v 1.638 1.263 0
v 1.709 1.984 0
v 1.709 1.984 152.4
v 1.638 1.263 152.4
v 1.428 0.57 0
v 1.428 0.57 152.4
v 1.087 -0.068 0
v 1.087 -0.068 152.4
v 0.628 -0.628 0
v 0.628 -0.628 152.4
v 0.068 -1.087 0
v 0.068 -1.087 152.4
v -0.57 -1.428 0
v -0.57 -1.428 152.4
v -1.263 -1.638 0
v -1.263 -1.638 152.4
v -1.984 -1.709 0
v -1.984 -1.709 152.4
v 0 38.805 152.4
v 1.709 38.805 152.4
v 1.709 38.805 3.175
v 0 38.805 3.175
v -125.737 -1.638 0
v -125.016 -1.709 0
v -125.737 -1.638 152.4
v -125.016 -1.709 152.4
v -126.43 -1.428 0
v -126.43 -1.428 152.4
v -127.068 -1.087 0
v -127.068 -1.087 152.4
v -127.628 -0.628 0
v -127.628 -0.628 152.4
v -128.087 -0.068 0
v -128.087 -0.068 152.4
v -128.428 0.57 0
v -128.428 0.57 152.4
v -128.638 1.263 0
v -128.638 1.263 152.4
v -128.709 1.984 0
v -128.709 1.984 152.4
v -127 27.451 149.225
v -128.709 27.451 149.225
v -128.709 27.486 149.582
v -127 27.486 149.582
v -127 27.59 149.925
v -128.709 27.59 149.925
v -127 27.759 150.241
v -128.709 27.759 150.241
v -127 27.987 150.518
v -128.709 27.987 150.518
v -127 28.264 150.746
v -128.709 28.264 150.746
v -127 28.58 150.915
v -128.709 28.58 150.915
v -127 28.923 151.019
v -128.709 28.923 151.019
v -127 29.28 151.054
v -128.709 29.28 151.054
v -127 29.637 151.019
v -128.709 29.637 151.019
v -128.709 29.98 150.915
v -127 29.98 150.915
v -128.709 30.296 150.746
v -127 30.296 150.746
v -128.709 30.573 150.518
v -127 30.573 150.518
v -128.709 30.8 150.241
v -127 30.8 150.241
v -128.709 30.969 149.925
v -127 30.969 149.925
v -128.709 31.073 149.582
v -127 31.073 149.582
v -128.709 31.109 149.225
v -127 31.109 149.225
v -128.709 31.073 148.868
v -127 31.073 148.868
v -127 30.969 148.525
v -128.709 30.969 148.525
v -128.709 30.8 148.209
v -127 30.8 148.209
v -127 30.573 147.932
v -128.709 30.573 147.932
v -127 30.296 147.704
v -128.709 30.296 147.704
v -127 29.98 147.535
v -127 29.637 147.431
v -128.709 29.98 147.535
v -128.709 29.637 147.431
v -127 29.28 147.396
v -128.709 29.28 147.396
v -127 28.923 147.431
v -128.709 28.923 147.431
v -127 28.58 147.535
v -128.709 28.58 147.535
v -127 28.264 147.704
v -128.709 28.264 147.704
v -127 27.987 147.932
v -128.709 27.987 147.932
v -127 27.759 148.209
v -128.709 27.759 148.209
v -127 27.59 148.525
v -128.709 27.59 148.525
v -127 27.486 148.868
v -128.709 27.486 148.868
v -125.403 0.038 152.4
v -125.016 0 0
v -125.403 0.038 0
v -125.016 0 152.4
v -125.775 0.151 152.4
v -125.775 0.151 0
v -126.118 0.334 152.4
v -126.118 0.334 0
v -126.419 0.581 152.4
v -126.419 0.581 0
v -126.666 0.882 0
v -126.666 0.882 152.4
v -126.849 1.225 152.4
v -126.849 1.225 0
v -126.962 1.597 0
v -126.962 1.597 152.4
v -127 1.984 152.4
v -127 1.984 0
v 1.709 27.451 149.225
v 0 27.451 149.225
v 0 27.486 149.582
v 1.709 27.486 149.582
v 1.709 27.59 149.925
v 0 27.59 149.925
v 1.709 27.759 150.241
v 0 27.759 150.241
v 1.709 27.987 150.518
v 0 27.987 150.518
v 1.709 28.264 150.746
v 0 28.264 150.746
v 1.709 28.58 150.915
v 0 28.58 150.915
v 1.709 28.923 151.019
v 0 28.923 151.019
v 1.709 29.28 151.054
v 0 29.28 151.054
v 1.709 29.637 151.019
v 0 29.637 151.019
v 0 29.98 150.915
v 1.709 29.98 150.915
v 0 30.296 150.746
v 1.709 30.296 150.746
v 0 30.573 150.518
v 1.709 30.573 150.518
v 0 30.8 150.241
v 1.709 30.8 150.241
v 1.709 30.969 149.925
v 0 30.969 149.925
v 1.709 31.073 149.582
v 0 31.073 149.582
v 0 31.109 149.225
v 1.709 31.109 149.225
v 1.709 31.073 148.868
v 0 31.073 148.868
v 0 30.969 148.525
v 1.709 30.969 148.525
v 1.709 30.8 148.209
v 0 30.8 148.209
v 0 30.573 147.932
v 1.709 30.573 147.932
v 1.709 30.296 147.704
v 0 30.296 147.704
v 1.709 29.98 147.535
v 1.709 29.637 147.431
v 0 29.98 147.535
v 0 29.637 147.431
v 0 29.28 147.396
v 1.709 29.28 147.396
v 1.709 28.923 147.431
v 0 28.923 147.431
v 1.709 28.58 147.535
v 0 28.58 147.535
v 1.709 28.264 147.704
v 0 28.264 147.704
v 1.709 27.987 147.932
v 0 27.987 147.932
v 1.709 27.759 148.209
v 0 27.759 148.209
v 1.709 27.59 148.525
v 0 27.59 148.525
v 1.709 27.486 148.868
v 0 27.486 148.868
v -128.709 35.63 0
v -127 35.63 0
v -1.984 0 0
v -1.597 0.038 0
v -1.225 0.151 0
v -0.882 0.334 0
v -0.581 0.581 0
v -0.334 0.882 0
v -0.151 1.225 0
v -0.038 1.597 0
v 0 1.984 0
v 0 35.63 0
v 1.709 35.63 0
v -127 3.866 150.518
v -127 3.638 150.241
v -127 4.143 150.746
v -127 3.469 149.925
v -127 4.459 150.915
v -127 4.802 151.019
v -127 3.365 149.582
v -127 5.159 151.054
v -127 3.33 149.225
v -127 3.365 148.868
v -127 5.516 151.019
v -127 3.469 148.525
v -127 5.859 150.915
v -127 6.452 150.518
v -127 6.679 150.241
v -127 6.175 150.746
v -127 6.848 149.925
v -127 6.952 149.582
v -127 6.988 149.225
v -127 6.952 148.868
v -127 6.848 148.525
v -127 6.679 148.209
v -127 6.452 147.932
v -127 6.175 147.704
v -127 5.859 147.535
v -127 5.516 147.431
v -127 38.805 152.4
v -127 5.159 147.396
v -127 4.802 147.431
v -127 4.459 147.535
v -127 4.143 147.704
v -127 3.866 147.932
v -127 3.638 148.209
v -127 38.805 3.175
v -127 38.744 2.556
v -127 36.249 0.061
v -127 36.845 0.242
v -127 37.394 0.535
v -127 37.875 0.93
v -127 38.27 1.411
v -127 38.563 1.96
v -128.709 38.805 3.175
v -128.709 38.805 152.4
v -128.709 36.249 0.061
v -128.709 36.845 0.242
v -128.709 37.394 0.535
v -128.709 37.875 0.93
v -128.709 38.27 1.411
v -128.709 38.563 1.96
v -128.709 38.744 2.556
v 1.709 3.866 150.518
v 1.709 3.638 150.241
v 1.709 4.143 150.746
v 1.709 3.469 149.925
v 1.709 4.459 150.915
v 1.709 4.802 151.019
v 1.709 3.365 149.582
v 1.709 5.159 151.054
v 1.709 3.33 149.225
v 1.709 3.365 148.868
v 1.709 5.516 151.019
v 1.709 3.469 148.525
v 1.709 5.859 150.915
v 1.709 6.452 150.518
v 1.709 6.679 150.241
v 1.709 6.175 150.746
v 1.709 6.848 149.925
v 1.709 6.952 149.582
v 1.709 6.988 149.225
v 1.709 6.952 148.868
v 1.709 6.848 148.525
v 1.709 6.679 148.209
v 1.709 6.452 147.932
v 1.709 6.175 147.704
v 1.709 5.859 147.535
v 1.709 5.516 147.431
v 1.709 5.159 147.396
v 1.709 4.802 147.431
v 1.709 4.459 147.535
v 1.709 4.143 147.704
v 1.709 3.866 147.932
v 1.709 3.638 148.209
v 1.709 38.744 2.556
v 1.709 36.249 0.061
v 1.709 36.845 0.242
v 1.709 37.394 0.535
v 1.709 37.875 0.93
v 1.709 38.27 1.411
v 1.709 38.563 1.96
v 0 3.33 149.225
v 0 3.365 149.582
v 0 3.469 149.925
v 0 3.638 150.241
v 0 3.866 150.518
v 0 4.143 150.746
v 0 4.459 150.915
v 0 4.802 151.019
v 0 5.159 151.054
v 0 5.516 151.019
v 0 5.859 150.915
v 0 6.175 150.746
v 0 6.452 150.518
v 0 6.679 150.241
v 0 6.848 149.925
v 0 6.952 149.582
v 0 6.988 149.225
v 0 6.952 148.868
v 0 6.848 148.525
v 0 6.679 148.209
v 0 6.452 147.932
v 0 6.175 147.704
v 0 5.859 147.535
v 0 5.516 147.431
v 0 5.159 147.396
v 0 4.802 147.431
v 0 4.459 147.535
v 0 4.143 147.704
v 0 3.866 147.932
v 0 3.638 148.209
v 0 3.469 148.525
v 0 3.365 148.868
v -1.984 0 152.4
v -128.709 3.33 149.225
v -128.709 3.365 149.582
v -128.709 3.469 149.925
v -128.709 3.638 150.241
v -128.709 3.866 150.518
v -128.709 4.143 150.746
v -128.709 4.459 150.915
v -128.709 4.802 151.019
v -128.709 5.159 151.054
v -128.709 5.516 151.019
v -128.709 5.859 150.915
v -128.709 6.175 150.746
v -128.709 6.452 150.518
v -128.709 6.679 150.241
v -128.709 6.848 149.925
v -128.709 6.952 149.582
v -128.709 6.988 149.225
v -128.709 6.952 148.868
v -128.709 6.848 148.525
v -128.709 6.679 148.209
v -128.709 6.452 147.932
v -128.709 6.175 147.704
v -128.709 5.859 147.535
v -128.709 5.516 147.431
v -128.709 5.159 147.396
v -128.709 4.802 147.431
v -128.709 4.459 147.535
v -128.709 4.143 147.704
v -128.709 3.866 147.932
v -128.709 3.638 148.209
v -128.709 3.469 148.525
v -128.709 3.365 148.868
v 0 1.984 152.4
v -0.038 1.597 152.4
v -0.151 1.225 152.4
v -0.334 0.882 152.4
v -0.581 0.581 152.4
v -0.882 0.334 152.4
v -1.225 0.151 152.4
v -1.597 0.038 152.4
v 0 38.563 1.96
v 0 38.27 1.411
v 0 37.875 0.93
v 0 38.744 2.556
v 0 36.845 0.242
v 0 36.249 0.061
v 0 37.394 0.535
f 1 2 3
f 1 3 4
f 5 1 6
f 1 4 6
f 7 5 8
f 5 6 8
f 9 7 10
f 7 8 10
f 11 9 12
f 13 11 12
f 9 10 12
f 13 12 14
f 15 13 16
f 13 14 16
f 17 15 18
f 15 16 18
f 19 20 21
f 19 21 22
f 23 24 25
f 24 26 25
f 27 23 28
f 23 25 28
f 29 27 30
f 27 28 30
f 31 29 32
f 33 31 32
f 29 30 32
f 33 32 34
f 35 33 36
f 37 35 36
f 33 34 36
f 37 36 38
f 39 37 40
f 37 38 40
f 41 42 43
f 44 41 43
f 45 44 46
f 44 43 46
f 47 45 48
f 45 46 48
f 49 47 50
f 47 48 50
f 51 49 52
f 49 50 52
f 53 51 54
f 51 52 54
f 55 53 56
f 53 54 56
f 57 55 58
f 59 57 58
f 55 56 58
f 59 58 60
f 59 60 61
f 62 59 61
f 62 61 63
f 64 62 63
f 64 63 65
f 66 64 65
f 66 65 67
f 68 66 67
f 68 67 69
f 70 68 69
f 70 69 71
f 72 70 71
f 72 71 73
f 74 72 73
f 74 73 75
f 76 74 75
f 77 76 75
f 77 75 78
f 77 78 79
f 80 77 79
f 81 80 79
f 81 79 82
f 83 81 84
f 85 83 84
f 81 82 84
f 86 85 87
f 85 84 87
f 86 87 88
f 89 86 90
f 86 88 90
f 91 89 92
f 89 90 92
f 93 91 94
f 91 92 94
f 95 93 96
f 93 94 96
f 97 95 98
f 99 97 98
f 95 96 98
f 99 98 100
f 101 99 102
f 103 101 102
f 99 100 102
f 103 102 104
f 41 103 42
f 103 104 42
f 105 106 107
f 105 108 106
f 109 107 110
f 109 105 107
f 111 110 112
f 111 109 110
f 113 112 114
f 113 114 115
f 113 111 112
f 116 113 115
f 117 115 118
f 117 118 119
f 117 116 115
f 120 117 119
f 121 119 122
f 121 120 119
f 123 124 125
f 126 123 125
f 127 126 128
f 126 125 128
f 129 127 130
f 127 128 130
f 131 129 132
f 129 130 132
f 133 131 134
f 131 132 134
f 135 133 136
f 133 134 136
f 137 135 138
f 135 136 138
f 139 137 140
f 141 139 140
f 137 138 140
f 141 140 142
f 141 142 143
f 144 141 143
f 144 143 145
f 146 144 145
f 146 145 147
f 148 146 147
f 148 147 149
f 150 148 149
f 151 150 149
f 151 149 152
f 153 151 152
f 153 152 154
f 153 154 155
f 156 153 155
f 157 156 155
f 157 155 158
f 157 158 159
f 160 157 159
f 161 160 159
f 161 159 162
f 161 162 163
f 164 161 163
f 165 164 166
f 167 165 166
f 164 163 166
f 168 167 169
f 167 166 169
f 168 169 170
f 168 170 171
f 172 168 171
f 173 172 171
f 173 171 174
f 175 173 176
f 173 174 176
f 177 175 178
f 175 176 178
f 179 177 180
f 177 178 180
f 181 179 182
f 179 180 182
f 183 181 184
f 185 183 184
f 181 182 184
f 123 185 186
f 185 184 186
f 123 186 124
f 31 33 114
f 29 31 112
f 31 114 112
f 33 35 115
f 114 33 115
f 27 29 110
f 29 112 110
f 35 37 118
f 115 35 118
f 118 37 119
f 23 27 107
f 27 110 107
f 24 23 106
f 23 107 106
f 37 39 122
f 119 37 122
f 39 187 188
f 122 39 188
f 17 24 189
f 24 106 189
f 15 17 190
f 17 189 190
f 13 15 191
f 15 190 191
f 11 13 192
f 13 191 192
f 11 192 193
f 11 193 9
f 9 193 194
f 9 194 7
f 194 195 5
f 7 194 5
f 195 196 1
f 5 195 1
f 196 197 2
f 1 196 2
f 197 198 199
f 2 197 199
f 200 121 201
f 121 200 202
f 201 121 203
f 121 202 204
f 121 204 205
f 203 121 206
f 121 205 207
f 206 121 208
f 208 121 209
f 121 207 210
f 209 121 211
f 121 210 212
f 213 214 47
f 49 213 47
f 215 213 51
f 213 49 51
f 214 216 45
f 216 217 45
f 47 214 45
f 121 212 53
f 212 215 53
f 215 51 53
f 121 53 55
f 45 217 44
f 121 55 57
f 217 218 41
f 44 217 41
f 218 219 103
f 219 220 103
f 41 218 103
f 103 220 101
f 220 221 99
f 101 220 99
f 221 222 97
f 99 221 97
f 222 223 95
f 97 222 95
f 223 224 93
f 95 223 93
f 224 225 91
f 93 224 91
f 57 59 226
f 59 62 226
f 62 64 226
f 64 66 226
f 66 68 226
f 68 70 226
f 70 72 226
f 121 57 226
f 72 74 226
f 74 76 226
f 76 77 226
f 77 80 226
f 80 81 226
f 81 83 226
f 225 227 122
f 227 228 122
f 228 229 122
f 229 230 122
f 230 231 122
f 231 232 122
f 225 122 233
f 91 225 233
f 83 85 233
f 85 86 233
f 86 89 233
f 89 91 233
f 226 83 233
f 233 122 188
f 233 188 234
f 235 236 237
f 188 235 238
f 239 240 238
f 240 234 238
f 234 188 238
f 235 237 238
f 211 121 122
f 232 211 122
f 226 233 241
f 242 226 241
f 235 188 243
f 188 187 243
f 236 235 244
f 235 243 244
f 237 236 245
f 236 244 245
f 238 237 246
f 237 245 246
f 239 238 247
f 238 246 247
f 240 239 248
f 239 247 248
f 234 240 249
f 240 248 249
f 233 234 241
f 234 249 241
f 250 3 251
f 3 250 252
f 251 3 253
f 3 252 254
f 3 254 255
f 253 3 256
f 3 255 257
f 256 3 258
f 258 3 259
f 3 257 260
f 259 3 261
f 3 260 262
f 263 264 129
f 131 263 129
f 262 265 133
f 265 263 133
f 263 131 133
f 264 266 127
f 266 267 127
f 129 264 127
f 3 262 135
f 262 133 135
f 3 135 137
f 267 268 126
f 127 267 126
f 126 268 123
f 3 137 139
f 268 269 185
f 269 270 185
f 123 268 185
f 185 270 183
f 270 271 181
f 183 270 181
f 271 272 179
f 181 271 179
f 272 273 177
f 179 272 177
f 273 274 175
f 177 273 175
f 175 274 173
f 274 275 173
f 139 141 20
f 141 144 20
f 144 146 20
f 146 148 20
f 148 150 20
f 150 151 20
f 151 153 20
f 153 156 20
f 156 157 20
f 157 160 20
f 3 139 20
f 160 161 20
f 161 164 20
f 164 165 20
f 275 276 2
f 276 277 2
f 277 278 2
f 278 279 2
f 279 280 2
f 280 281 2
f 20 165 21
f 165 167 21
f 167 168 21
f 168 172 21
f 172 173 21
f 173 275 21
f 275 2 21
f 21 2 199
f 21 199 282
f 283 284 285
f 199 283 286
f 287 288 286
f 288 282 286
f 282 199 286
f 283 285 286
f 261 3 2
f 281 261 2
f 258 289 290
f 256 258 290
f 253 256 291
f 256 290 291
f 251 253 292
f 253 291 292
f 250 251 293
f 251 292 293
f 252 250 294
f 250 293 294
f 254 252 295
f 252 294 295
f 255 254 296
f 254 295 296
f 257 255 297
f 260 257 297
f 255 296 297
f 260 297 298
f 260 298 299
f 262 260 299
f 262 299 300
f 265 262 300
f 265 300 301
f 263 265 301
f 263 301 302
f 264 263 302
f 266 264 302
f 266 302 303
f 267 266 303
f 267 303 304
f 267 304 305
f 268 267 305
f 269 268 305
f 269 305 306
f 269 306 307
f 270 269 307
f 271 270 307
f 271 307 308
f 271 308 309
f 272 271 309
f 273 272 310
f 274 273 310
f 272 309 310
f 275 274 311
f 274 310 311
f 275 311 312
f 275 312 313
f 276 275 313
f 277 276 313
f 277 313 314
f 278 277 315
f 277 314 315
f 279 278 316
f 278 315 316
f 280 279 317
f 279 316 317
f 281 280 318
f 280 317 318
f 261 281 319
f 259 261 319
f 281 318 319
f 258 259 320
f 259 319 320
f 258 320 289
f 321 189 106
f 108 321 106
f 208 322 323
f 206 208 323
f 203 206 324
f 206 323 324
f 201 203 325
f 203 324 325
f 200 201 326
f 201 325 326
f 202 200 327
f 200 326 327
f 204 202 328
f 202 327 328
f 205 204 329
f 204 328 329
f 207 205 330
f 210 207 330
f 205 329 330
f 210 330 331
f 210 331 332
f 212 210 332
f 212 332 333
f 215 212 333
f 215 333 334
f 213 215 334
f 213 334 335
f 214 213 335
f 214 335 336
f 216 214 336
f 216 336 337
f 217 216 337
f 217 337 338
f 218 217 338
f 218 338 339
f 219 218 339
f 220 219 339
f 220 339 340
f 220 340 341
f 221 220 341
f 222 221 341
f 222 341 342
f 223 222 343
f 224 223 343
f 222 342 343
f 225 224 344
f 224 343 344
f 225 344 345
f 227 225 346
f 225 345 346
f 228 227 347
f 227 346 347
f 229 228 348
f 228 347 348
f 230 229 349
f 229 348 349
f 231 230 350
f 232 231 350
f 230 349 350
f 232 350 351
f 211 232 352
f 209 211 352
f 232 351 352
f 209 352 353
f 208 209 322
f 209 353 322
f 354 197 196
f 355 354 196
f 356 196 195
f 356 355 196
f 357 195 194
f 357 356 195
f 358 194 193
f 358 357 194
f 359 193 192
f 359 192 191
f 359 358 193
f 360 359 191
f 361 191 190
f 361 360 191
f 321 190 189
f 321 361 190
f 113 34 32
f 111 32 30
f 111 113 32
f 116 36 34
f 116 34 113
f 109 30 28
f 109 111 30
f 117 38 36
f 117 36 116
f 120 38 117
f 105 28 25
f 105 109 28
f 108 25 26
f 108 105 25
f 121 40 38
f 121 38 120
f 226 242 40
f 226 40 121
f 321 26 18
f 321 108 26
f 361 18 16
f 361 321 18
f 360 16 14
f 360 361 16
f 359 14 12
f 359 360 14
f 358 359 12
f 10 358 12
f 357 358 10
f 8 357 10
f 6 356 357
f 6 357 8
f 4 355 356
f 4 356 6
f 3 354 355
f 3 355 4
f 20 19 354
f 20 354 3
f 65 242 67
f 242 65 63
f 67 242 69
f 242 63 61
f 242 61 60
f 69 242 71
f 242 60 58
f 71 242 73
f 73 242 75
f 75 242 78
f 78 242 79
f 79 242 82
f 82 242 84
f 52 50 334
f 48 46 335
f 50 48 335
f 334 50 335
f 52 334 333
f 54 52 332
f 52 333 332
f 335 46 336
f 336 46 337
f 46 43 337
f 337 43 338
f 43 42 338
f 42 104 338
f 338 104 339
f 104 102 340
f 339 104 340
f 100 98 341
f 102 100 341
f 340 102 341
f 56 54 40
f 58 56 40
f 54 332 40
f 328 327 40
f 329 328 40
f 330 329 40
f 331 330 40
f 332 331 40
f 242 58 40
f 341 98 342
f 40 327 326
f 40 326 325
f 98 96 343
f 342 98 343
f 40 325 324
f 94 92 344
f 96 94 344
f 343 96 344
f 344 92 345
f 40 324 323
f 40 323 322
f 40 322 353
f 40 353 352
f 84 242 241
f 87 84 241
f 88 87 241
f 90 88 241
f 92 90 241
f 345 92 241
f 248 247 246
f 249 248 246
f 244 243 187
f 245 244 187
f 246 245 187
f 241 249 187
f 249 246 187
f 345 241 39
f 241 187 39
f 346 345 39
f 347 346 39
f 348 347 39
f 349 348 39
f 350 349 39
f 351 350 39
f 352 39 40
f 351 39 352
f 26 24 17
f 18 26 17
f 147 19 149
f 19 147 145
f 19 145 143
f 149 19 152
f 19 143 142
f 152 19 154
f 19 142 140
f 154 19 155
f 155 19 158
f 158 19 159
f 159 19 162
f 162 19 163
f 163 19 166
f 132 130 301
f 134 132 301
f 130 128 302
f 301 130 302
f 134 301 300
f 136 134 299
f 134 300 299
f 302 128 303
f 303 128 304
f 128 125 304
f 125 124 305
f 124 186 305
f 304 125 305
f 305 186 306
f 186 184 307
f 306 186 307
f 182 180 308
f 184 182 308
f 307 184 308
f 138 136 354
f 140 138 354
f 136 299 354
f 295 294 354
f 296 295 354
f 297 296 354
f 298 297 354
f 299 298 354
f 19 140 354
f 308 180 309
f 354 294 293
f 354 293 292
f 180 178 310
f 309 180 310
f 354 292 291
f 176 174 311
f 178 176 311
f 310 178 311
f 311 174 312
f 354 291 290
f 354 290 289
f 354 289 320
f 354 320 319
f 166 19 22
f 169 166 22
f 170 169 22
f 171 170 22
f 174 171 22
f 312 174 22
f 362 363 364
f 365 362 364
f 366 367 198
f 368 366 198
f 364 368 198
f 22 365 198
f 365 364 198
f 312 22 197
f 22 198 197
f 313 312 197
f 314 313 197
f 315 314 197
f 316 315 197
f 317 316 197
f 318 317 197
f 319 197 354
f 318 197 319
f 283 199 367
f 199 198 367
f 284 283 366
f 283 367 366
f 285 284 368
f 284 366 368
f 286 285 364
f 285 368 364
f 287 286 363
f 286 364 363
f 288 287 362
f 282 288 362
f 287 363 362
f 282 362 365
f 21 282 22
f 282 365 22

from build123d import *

# Parameters (mm, degrees)
F1_DEPTH = 152.4
F2_R     = 1.98374
F3_R     = 3.69316
F4_R     = 1.8288
F5_DEPTH = 130.41884
F6_R     = 3.175


with BuildPart() as f1:
    # F0 (on Top) → F1 (new body)
    with BuildSketch(Plane.XY):
        Polygon((0, 38.8047992), (0, 0), (-127, 0), (-127, 38.8047992), (-128.70942, 38.8047992), (-128.70942, -1.70942), (1.70942, -1.70942), (1.70942, 38.8047992), align=None)
    extrude(amount=F1_DEPTH)

    # F2
    f2_edges = [f1.edges().sort_by_distance(p)[0] for p in [
        (0, 0, 76.2),
        (-127, 0, 76.2),
    ]]
    fillet(f2_edges, radius=F2_R)

    # F3
    f3_edges = [f1.edges().sort_by_distance(p)[0] for p in [
        (1.70942, -1.70942, 76.2),
        (-128.70942, -1.70942, 76.2),
    ]]
    fillet(f3_edges, radius=F3_R)

    # F4 (on face) → F5 (cut, through all)
    with BuildSketch(Plane(origin=(-128.70942, 0, 0), x_dir=(0, -1, 0), z_dir=(-1, 0, 0))):
        with Locations((-29.2797992, 149.225)):
            Circle(F4_R)
        with Locations((-5.15874, 149.225)):
            Circle(F4_R)
    extrude(amount=-F5_DEPTH, mode=Mode.SUBTRACT)

    # F6
    f6_edges = [f1.edges().sort_by_distance(p)[0] for p in [
        (0.85471, 38.804799, 0),
        (-127.85471, 38.804799, 0),
    ]]
    fillet(f6_edges, radius=F6_R)


solid = f1.part
